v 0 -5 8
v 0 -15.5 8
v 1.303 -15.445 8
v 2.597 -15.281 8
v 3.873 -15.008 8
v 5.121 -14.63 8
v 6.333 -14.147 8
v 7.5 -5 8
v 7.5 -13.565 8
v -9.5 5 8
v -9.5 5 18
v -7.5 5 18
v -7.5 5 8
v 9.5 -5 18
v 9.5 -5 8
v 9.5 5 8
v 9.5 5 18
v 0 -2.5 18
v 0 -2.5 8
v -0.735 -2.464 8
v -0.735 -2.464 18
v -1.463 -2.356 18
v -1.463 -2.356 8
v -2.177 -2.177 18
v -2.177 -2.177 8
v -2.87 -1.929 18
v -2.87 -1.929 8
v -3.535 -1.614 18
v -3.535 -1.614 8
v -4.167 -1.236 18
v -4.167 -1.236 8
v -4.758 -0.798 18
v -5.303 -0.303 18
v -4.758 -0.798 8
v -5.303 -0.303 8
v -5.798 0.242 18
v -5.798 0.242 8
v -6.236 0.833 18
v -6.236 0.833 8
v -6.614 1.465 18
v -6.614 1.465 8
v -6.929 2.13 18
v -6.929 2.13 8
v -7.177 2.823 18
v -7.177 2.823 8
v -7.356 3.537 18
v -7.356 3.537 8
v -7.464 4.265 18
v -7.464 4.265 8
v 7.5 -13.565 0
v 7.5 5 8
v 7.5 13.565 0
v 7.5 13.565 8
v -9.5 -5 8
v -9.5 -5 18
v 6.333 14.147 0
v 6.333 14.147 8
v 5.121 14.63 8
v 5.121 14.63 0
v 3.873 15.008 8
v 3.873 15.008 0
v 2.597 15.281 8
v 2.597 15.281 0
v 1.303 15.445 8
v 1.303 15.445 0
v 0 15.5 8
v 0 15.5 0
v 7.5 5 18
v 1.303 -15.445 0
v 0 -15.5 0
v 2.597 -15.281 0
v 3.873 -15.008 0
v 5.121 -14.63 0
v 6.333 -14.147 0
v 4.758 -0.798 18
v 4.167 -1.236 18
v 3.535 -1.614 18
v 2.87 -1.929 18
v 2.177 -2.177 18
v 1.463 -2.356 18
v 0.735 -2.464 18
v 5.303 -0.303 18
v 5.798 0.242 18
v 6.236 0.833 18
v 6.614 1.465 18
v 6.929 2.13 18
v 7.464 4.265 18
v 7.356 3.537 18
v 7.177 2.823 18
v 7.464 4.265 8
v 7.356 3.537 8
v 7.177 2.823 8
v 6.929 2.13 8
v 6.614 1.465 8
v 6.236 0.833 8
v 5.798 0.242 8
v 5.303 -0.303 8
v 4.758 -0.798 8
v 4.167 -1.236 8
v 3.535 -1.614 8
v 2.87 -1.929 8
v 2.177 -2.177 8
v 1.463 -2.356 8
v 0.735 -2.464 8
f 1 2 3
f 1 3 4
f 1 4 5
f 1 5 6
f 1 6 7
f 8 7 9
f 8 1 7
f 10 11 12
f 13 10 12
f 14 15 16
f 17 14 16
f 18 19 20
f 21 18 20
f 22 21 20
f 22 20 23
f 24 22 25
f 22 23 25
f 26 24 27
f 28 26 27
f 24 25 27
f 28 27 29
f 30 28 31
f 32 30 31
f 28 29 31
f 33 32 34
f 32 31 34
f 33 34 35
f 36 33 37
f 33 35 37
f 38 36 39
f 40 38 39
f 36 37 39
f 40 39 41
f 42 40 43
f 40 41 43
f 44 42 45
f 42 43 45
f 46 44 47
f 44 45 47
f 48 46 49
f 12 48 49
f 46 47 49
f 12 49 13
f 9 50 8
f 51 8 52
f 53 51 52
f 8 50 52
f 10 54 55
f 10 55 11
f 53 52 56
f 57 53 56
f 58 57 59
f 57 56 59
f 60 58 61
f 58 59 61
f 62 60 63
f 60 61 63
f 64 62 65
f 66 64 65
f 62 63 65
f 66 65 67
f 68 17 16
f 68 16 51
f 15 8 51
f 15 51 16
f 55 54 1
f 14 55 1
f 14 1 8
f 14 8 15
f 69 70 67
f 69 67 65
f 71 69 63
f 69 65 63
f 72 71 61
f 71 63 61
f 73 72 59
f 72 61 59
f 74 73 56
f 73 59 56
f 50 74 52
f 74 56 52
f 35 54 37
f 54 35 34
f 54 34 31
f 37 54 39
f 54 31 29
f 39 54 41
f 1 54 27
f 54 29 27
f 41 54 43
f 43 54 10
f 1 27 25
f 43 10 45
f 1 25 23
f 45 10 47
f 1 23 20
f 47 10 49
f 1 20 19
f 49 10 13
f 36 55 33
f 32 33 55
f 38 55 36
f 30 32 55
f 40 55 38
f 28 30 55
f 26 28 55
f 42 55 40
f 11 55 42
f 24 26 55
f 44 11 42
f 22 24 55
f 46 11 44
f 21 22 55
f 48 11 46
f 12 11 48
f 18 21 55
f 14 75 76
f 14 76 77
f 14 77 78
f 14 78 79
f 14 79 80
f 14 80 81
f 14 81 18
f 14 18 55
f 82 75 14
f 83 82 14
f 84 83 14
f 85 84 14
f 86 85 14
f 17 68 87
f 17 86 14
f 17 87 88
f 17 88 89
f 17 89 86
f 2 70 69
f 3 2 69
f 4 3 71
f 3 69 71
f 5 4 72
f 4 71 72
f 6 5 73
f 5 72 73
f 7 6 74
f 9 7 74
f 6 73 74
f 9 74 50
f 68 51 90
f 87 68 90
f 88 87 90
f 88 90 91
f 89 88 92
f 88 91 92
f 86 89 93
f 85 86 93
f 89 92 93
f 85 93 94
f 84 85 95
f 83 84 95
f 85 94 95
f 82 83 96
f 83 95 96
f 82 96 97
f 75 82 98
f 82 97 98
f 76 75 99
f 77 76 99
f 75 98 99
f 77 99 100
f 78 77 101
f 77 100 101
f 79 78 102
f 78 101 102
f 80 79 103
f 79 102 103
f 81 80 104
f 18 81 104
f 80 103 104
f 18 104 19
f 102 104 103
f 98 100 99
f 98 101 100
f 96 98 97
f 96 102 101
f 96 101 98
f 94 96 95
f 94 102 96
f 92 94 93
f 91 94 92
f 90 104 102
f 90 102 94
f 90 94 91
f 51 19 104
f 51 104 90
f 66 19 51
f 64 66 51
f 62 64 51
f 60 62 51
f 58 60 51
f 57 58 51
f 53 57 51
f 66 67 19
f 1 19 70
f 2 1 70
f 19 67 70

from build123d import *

# Parameters (mm, degrees)
EXTRUDE_1_DEPTH = 8
EXTRUDE_2_DEPTH = 10


with BuildPart() as part:
    # 草图1 → 凸台-拉伸1 (new body)
    with BuildSketch(Plane.XY):
        with BuildLine():
            Line((7.5, -13.564659966), (7.5, 13.564659966))
            ThreePointArc((7.5, 13.564659966), (3.872839431, 15.008368157), (0, 15.5))
            Line((0, 15.5), (0, -15.5))
            ThreePointArc((0, -15.5), (3.872839431, -15.008368157), (7.5, -13.564659966))
        make_face()
    extrude(amount=EXTRUDE_1_DEPTH)

    # 草图3 → 凸台-拉伸2 (add)
    with BuildSketch(Plane.XY.offset(8)):
        Polygon((7.5, -2.5), (7.5, -5), (9.5, -5), (9.5, 5), (7.5, 5), align=None)
        with BuildLine():
            Line((0, -2.5), (0, -5))
            Line((0, -5), (7.5, -5))
            Line((7.5, -5), (7.5, -2.5))
            Line((7.5, -2.5), (7.5, 5))
            ThreePointArc((7.5, 5), (5.303300859, -0.303300859), (0, -2.5))
        make_face()
        with BuildLine():
            Line((-7.5, 5), (-7.5, -2.5))
            Line((-7.5, -2.5), (-7.5, -5))
            Line((-7.5, -5), (0, -5))
            Line((0, -5), (0, -2.5))
            ThreePointArc((0, -2.5), (-5.303300859, -0.303300859), (-7.5, 5))
        make_face()
        Polygon((-9.5, 5), (-7.5, 5), (-7.5, -2.5), (-7.5, -5), (-9.5, -5), align=None)
    extrude(amount=EXTRUDE_2_DEPTH)


solid = part.part
